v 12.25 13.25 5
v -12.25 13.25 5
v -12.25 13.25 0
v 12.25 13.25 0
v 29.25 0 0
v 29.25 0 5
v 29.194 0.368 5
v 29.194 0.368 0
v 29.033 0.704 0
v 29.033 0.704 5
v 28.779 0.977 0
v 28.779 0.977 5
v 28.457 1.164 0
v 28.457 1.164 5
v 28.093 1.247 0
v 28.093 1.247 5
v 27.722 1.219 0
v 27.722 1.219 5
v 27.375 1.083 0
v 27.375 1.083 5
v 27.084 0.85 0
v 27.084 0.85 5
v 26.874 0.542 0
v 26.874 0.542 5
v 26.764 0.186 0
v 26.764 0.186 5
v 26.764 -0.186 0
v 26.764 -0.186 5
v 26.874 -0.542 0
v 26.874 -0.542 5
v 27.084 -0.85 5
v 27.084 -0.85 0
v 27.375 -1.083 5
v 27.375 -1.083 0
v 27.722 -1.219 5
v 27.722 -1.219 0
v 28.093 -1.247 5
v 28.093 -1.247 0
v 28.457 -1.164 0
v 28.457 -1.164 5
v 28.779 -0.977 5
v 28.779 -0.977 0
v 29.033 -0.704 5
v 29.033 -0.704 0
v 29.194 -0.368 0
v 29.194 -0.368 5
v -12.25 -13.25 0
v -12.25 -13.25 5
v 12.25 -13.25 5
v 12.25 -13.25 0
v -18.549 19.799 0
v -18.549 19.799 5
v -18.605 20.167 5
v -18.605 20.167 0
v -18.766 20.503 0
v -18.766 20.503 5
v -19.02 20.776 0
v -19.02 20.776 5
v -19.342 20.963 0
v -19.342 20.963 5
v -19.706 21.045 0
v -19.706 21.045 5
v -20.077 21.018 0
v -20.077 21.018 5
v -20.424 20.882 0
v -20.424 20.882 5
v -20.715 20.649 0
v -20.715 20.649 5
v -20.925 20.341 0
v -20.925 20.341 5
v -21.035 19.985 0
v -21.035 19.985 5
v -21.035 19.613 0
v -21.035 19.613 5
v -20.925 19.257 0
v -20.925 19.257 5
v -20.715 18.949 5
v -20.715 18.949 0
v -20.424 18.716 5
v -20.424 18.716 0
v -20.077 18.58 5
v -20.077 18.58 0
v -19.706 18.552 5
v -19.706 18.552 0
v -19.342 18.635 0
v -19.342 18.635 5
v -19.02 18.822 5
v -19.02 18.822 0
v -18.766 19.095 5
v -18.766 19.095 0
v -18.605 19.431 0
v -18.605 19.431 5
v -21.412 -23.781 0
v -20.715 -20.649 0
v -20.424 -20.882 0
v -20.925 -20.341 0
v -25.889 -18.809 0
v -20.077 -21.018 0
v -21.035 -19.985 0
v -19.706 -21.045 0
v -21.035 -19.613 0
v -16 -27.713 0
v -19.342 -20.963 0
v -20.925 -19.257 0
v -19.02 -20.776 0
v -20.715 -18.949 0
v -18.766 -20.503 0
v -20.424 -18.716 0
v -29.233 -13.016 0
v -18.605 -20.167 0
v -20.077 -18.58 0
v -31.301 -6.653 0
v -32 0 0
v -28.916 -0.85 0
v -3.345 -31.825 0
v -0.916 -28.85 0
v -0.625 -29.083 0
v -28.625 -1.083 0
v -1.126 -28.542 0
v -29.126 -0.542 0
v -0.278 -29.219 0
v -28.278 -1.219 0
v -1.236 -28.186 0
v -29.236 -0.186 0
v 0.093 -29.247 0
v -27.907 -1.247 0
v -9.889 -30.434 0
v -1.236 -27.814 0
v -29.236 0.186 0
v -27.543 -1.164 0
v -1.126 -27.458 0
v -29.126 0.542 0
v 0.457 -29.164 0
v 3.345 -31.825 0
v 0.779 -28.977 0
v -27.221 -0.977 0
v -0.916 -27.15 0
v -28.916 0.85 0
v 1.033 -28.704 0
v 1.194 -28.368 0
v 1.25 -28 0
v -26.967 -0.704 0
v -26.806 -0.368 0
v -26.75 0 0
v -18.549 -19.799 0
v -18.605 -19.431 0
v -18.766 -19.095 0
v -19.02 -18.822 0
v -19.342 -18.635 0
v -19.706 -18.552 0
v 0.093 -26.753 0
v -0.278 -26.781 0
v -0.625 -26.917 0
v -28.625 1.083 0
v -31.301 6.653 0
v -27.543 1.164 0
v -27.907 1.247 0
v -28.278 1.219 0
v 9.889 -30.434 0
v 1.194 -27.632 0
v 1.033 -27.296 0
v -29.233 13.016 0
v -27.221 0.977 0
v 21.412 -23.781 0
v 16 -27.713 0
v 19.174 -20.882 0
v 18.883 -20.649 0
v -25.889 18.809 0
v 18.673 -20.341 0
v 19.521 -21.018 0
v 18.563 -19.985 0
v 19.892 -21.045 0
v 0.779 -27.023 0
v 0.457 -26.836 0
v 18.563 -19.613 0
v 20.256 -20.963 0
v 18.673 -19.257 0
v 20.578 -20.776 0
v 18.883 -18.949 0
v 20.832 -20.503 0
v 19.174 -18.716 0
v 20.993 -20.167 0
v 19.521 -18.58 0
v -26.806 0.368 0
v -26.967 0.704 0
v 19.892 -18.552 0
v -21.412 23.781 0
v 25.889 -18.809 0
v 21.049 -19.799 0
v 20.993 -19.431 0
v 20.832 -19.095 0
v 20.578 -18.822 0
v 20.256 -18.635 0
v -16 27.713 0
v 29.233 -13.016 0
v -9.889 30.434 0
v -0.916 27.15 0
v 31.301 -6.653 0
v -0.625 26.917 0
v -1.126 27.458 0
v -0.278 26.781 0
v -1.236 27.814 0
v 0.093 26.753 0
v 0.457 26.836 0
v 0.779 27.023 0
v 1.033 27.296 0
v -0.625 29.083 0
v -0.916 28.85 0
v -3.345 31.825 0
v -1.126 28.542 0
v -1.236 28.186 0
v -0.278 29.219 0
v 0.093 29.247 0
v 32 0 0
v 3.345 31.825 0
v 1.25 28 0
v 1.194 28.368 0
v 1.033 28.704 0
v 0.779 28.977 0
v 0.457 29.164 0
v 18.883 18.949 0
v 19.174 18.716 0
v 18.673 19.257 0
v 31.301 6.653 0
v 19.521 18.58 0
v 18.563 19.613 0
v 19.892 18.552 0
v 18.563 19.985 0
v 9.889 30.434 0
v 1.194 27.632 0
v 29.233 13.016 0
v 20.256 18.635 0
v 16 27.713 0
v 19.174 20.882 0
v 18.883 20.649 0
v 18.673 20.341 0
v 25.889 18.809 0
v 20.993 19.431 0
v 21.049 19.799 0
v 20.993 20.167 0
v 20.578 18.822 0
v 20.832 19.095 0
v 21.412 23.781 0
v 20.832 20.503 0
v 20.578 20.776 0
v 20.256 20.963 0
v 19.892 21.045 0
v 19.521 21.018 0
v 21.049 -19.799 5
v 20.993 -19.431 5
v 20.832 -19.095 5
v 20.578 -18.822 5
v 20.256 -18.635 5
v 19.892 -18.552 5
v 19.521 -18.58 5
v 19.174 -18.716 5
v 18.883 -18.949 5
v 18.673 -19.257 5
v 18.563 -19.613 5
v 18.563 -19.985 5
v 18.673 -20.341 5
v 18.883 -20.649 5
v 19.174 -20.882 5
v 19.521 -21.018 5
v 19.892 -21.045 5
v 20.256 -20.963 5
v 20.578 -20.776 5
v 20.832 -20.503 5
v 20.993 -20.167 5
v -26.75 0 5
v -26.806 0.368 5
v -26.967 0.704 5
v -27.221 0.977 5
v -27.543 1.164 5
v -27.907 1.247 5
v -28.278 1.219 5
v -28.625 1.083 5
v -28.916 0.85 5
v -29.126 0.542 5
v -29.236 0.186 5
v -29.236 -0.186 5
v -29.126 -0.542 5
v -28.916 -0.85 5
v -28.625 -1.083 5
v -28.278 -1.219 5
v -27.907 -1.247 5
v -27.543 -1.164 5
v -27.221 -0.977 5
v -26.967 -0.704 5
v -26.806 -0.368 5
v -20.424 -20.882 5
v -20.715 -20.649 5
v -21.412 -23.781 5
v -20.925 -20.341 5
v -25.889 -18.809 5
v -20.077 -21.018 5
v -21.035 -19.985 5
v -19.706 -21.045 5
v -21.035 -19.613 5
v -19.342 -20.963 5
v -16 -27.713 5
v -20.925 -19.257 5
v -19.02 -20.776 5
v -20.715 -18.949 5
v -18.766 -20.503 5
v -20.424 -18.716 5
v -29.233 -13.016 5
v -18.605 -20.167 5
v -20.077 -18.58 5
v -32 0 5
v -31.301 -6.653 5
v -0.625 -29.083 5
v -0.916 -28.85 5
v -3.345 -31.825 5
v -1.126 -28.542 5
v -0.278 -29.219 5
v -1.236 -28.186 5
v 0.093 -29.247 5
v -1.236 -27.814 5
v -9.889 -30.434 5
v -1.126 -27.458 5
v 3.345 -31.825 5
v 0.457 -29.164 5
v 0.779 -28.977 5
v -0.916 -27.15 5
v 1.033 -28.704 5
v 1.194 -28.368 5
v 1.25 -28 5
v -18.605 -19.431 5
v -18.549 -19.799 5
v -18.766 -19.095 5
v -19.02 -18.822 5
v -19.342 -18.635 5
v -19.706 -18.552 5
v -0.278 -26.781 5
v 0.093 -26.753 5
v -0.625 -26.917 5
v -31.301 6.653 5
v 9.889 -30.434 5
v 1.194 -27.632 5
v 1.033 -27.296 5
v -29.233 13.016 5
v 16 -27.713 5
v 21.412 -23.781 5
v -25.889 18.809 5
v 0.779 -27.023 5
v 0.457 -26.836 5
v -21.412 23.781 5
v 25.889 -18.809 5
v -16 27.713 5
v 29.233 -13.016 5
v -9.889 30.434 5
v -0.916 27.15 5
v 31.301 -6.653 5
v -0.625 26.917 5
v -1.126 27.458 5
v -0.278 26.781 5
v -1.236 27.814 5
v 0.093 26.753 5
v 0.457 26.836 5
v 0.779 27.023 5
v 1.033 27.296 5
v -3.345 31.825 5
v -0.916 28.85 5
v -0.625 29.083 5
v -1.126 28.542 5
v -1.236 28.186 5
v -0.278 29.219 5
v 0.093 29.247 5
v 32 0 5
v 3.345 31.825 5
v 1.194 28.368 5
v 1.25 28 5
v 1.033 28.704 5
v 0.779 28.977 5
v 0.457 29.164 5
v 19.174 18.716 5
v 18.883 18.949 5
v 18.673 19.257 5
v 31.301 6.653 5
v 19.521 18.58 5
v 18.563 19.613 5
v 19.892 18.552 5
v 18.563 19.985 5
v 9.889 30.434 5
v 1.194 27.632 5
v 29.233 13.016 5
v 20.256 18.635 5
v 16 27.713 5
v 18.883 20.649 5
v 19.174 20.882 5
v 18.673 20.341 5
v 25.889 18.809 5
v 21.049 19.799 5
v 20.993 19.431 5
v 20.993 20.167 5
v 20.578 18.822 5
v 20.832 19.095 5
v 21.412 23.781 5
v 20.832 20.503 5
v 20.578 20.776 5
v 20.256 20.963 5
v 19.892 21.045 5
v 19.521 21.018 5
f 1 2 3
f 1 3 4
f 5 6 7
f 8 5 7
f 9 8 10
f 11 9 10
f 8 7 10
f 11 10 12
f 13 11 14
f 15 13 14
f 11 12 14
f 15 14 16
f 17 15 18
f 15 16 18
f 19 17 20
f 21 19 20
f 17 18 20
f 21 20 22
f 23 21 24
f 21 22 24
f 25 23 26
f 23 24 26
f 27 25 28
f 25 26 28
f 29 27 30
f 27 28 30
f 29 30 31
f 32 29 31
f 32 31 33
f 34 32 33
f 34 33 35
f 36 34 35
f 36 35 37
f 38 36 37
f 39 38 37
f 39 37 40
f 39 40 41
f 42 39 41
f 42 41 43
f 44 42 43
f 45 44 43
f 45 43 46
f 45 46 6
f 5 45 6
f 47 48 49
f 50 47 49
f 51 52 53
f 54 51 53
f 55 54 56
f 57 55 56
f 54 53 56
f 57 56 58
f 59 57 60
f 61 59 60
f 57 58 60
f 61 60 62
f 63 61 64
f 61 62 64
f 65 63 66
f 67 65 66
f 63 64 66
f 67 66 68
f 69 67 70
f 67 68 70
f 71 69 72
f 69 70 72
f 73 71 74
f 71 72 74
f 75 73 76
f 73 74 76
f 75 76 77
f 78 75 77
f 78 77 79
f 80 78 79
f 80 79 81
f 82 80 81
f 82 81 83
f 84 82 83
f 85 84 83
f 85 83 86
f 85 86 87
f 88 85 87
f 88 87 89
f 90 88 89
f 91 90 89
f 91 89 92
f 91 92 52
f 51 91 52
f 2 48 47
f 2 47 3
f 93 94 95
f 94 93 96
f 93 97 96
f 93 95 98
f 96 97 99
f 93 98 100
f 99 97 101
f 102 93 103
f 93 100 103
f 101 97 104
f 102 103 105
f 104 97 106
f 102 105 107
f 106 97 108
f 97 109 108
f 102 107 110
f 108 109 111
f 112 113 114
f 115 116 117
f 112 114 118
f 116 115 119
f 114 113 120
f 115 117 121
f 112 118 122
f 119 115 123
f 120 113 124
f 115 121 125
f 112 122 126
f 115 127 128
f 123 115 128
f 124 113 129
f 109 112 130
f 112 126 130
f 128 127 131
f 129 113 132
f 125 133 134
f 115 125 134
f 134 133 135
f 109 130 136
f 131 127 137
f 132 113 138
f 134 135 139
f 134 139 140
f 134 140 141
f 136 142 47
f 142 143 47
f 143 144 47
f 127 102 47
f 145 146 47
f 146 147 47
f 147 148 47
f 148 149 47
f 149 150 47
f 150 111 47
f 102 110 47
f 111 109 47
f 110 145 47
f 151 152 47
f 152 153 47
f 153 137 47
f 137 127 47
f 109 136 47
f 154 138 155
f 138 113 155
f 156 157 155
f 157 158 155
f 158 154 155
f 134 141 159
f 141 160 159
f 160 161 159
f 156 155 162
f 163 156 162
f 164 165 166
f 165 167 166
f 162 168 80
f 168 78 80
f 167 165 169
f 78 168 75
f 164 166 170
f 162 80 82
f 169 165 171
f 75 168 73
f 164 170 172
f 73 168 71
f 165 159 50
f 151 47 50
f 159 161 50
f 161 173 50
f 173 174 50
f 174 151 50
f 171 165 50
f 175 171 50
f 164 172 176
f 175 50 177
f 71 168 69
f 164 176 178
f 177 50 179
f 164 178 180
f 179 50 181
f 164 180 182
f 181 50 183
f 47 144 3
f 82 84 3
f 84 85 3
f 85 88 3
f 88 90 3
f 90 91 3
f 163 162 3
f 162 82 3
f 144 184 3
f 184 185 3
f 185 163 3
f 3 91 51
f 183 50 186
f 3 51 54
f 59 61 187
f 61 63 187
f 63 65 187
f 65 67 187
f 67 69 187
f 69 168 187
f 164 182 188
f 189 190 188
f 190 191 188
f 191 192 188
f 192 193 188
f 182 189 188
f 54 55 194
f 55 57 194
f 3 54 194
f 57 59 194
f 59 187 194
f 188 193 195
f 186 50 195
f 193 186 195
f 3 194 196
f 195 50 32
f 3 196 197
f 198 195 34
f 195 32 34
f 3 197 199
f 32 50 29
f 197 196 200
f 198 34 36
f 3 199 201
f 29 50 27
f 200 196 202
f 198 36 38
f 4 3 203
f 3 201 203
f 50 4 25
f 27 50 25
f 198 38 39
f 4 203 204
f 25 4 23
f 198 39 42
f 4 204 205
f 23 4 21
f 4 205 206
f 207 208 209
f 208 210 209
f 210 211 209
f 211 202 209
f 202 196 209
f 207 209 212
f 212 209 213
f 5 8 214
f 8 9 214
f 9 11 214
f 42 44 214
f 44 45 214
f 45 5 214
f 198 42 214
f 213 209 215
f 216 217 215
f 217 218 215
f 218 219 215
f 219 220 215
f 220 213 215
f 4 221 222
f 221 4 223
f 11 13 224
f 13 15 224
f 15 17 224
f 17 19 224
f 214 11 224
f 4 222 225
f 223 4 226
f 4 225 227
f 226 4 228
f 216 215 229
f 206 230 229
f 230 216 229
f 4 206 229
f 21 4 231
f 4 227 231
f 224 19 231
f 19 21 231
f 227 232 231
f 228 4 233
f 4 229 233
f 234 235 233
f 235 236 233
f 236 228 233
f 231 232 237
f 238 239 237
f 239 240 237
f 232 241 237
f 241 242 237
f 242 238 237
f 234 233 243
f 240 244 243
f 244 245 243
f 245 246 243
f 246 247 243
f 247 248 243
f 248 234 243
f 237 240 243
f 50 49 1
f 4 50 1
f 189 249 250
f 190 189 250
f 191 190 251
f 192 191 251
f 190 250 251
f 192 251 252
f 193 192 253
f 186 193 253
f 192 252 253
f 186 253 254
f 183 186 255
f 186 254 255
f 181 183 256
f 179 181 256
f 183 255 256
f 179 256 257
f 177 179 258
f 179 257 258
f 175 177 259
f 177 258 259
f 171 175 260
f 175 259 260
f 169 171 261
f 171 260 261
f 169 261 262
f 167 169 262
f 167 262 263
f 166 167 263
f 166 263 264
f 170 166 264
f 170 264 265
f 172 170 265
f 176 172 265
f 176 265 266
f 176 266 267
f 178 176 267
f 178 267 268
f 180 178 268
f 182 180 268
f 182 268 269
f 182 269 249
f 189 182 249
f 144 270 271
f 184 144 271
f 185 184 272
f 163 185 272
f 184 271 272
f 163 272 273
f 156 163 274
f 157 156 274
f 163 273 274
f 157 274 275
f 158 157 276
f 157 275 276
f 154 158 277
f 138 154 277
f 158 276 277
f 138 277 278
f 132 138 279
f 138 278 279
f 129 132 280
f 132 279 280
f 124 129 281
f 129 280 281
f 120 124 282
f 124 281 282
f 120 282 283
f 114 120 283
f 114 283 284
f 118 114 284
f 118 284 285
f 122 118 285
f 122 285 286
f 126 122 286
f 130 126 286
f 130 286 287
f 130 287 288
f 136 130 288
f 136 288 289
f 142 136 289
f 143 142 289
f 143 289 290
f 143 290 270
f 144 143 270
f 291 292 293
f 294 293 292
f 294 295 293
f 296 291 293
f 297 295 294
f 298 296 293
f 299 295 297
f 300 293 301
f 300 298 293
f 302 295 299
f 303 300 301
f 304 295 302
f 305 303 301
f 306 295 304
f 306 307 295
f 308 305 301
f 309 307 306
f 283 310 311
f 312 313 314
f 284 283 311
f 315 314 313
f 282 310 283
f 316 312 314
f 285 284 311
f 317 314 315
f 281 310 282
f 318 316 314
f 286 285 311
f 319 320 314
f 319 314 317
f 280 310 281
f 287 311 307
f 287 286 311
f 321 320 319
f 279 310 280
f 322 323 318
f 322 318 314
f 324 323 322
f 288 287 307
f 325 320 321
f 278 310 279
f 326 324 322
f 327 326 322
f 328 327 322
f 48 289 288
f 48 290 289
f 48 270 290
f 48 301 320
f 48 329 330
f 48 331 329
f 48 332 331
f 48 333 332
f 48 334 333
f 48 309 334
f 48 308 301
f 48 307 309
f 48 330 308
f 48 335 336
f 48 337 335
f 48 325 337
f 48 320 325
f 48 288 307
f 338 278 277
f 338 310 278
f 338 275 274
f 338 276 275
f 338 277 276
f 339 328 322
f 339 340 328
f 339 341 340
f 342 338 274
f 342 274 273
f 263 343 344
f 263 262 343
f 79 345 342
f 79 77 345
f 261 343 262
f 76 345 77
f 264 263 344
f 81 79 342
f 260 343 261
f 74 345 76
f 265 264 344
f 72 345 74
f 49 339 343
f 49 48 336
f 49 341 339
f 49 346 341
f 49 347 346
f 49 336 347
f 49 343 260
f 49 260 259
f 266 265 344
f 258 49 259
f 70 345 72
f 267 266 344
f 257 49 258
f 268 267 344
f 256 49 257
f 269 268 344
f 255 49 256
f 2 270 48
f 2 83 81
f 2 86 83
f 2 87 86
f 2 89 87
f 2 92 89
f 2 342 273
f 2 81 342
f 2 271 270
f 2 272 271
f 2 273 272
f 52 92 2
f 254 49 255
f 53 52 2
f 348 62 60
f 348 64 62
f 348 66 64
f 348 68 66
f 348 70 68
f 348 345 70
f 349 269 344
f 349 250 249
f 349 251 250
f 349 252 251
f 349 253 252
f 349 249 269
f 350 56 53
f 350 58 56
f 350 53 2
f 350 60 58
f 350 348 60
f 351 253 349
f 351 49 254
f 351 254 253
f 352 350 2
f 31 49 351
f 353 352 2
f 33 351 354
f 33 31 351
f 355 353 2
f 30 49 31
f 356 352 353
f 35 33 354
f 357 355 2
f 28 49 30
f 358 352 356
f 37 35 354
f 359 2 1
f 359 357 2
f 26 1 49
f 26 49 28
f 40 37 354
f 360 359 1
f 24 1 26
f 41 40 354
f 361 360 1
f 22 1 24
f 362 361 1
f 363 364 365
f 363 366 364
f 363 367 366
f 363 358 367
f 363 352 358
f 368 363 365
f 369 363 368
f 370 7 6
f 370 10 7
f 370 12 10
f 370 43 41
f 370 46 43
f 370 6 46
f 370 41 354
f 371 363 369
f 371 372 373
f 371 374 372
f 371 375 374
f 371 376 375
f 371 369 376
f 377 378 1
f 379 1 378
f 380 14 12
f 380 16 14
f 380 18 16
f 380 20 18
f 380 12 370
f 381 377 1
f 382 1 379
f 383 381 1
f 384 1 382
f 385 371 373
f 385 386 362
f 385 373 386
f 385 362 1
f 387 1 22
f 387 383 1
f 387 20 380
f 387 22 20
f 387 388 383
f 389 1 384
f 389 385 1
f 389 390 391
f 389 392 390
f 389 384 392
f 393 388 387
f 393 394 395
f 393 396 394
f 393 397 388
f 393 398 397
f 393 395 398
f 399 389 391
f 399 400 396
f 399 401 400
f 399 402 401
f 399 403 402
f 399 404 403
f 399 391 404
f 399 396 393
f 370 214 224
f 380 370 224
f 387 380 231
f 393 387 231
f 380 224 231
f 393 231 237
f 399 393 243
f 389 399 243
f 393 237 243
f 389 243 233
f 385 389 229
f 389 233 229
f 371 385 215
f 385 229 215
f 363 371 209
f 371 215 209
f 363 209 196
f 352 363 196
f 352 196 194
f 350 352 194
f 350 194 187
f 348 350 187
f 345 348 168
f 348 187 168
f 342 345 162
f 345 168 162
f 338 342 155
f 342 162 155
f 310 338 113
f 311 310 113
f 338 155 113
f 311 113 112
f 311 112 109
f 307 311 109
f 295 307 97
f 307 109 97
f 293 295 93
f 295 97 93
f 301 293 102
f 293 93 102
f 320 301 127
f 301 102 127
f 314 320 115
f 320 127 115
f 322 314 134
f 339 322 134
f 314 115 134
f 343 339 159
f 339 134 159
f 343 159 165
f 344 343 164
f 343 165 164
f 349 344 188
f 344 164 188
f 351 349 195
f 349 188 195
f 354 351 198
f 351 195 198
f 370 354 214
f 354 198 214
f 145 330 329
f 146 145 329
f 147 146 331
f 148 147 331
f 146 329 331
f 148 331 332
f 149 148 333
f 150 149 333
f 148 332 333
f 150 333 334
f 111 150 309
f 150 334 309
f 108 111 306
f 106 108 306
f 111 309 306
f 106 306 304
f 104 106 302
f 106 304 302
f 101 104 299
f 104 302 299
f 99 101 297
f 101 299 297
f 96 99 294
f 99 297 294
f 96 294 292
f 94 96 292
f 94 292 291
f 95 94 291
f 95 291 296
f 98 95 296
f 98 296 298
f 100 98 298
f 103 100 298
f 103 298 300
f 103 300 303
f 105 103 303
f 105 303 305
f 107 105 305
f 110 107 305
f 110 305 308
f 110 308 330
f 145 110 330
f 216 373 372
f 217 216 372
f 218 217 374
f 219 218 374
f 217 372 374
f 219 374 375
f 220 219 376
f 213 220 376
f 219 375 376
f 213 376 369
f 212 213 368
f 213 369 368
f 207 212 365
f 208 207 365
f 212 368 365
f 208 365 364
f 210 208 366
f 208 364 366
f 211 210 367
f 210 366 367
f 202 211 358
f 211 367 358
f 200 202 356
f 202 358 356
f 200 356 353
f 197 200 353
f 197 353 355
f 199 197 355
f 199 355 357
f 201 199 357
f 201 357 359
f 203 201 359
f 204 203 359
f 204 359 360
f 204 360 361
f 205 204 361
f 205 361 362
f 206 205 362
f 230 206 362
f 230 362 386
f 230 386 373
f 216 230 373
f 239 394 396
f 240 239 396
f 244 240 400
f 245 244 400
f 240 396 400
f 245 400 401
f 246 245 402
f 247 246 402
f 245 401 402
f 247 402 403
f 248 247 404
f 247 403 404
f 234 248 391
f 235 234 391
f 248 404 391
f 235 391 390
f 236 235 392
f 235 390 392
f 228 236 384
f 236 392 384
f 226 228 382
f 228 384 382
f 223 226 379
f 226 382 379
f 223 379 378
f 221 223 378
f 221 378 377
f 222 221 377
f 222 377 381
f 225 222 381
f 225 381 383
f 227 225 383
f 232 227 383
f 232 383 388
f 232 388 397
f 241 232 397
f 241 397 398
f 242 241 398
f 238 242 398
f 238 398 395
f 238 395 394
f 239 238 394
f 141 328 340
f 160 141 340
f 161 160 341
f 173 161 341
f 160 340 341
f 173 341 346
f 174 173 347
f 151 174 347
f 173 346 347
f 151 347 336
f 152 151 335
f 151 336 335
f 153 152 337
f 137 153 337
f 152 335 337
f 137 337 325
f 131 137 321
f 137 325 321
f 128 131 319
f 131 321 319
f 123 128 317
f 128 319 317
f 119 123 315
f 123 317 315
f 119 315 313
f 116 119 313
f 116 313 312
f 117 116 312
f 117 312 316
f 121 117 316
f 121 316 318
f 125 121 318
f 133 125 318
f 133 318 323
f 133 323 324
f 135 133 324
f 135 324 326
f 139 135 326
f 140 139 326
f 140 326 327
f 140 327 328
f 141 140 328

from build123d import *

# Parameters (mm, degrees)
CROQUIS1_R              = 32
SALIENTE_EXTRUIR1_DEPTH = 5
CROQUIS2_R              = 1.25
CORTAR_EXTRUIR1_DEPTH   = 46.530209751
CROQUIS3_W              = 24.5
CROQUIS3_H              = 26.5
CORTAR_EXTRUIR2_DEPTH   = 10


with BuildPart() as part:
    # Croquis1 → Saliente-Extruir1 (new body)
    with BuildSketch(Plane.XY):
        Circle(CROQUIS1_R)
    extrude(amount=SALIENTE_EXTRUIR1_DEPTH)

    # Croquis2 → Cortar-Extruir1 (cut, through all)
    with BuildSketch(Plane.XY.offset(5)):
        with Locations((0, 28)):
            Circle(CROQUIS2_R)
        with Locations((19.798989873, 19.798989873)):
            Circle(CROQUIS2_R)
        with Locations((28, 0)):
            Circle(CROQUIS2_R)
        with Locations((19.798989873, -19.798989873)):
            Circle(CROQUIS2_R)
        with Locations((0, -28)):
            Circle(CROQUIS2_R)
        with Locations((-19.798989873, -19.798989873)):
            Circle(CROQUIS2_R)
        with Locations((-28, 0)):
            Circle(CROQUIS2_R)
        with Locations((-19.798989873, 19.798989873)):
            Circle(CROQUIS2_R)
    extrude(amount=-CORTAR_EXTRUIR1_DEPTH, mode=Mode.SUBTRACT)

    # Croquis3 → Cortar-Extruir2 (cut)
    with BuildSketch(Plane.XY.offset(5)):
        Rectangle(CROQUIS3_W, CROQUIS3_H)
    extrude(amount=-CORTAR_EXTRUIR2_DEPTH, mode=Mode.SUBTRACT)


solid = part.part
